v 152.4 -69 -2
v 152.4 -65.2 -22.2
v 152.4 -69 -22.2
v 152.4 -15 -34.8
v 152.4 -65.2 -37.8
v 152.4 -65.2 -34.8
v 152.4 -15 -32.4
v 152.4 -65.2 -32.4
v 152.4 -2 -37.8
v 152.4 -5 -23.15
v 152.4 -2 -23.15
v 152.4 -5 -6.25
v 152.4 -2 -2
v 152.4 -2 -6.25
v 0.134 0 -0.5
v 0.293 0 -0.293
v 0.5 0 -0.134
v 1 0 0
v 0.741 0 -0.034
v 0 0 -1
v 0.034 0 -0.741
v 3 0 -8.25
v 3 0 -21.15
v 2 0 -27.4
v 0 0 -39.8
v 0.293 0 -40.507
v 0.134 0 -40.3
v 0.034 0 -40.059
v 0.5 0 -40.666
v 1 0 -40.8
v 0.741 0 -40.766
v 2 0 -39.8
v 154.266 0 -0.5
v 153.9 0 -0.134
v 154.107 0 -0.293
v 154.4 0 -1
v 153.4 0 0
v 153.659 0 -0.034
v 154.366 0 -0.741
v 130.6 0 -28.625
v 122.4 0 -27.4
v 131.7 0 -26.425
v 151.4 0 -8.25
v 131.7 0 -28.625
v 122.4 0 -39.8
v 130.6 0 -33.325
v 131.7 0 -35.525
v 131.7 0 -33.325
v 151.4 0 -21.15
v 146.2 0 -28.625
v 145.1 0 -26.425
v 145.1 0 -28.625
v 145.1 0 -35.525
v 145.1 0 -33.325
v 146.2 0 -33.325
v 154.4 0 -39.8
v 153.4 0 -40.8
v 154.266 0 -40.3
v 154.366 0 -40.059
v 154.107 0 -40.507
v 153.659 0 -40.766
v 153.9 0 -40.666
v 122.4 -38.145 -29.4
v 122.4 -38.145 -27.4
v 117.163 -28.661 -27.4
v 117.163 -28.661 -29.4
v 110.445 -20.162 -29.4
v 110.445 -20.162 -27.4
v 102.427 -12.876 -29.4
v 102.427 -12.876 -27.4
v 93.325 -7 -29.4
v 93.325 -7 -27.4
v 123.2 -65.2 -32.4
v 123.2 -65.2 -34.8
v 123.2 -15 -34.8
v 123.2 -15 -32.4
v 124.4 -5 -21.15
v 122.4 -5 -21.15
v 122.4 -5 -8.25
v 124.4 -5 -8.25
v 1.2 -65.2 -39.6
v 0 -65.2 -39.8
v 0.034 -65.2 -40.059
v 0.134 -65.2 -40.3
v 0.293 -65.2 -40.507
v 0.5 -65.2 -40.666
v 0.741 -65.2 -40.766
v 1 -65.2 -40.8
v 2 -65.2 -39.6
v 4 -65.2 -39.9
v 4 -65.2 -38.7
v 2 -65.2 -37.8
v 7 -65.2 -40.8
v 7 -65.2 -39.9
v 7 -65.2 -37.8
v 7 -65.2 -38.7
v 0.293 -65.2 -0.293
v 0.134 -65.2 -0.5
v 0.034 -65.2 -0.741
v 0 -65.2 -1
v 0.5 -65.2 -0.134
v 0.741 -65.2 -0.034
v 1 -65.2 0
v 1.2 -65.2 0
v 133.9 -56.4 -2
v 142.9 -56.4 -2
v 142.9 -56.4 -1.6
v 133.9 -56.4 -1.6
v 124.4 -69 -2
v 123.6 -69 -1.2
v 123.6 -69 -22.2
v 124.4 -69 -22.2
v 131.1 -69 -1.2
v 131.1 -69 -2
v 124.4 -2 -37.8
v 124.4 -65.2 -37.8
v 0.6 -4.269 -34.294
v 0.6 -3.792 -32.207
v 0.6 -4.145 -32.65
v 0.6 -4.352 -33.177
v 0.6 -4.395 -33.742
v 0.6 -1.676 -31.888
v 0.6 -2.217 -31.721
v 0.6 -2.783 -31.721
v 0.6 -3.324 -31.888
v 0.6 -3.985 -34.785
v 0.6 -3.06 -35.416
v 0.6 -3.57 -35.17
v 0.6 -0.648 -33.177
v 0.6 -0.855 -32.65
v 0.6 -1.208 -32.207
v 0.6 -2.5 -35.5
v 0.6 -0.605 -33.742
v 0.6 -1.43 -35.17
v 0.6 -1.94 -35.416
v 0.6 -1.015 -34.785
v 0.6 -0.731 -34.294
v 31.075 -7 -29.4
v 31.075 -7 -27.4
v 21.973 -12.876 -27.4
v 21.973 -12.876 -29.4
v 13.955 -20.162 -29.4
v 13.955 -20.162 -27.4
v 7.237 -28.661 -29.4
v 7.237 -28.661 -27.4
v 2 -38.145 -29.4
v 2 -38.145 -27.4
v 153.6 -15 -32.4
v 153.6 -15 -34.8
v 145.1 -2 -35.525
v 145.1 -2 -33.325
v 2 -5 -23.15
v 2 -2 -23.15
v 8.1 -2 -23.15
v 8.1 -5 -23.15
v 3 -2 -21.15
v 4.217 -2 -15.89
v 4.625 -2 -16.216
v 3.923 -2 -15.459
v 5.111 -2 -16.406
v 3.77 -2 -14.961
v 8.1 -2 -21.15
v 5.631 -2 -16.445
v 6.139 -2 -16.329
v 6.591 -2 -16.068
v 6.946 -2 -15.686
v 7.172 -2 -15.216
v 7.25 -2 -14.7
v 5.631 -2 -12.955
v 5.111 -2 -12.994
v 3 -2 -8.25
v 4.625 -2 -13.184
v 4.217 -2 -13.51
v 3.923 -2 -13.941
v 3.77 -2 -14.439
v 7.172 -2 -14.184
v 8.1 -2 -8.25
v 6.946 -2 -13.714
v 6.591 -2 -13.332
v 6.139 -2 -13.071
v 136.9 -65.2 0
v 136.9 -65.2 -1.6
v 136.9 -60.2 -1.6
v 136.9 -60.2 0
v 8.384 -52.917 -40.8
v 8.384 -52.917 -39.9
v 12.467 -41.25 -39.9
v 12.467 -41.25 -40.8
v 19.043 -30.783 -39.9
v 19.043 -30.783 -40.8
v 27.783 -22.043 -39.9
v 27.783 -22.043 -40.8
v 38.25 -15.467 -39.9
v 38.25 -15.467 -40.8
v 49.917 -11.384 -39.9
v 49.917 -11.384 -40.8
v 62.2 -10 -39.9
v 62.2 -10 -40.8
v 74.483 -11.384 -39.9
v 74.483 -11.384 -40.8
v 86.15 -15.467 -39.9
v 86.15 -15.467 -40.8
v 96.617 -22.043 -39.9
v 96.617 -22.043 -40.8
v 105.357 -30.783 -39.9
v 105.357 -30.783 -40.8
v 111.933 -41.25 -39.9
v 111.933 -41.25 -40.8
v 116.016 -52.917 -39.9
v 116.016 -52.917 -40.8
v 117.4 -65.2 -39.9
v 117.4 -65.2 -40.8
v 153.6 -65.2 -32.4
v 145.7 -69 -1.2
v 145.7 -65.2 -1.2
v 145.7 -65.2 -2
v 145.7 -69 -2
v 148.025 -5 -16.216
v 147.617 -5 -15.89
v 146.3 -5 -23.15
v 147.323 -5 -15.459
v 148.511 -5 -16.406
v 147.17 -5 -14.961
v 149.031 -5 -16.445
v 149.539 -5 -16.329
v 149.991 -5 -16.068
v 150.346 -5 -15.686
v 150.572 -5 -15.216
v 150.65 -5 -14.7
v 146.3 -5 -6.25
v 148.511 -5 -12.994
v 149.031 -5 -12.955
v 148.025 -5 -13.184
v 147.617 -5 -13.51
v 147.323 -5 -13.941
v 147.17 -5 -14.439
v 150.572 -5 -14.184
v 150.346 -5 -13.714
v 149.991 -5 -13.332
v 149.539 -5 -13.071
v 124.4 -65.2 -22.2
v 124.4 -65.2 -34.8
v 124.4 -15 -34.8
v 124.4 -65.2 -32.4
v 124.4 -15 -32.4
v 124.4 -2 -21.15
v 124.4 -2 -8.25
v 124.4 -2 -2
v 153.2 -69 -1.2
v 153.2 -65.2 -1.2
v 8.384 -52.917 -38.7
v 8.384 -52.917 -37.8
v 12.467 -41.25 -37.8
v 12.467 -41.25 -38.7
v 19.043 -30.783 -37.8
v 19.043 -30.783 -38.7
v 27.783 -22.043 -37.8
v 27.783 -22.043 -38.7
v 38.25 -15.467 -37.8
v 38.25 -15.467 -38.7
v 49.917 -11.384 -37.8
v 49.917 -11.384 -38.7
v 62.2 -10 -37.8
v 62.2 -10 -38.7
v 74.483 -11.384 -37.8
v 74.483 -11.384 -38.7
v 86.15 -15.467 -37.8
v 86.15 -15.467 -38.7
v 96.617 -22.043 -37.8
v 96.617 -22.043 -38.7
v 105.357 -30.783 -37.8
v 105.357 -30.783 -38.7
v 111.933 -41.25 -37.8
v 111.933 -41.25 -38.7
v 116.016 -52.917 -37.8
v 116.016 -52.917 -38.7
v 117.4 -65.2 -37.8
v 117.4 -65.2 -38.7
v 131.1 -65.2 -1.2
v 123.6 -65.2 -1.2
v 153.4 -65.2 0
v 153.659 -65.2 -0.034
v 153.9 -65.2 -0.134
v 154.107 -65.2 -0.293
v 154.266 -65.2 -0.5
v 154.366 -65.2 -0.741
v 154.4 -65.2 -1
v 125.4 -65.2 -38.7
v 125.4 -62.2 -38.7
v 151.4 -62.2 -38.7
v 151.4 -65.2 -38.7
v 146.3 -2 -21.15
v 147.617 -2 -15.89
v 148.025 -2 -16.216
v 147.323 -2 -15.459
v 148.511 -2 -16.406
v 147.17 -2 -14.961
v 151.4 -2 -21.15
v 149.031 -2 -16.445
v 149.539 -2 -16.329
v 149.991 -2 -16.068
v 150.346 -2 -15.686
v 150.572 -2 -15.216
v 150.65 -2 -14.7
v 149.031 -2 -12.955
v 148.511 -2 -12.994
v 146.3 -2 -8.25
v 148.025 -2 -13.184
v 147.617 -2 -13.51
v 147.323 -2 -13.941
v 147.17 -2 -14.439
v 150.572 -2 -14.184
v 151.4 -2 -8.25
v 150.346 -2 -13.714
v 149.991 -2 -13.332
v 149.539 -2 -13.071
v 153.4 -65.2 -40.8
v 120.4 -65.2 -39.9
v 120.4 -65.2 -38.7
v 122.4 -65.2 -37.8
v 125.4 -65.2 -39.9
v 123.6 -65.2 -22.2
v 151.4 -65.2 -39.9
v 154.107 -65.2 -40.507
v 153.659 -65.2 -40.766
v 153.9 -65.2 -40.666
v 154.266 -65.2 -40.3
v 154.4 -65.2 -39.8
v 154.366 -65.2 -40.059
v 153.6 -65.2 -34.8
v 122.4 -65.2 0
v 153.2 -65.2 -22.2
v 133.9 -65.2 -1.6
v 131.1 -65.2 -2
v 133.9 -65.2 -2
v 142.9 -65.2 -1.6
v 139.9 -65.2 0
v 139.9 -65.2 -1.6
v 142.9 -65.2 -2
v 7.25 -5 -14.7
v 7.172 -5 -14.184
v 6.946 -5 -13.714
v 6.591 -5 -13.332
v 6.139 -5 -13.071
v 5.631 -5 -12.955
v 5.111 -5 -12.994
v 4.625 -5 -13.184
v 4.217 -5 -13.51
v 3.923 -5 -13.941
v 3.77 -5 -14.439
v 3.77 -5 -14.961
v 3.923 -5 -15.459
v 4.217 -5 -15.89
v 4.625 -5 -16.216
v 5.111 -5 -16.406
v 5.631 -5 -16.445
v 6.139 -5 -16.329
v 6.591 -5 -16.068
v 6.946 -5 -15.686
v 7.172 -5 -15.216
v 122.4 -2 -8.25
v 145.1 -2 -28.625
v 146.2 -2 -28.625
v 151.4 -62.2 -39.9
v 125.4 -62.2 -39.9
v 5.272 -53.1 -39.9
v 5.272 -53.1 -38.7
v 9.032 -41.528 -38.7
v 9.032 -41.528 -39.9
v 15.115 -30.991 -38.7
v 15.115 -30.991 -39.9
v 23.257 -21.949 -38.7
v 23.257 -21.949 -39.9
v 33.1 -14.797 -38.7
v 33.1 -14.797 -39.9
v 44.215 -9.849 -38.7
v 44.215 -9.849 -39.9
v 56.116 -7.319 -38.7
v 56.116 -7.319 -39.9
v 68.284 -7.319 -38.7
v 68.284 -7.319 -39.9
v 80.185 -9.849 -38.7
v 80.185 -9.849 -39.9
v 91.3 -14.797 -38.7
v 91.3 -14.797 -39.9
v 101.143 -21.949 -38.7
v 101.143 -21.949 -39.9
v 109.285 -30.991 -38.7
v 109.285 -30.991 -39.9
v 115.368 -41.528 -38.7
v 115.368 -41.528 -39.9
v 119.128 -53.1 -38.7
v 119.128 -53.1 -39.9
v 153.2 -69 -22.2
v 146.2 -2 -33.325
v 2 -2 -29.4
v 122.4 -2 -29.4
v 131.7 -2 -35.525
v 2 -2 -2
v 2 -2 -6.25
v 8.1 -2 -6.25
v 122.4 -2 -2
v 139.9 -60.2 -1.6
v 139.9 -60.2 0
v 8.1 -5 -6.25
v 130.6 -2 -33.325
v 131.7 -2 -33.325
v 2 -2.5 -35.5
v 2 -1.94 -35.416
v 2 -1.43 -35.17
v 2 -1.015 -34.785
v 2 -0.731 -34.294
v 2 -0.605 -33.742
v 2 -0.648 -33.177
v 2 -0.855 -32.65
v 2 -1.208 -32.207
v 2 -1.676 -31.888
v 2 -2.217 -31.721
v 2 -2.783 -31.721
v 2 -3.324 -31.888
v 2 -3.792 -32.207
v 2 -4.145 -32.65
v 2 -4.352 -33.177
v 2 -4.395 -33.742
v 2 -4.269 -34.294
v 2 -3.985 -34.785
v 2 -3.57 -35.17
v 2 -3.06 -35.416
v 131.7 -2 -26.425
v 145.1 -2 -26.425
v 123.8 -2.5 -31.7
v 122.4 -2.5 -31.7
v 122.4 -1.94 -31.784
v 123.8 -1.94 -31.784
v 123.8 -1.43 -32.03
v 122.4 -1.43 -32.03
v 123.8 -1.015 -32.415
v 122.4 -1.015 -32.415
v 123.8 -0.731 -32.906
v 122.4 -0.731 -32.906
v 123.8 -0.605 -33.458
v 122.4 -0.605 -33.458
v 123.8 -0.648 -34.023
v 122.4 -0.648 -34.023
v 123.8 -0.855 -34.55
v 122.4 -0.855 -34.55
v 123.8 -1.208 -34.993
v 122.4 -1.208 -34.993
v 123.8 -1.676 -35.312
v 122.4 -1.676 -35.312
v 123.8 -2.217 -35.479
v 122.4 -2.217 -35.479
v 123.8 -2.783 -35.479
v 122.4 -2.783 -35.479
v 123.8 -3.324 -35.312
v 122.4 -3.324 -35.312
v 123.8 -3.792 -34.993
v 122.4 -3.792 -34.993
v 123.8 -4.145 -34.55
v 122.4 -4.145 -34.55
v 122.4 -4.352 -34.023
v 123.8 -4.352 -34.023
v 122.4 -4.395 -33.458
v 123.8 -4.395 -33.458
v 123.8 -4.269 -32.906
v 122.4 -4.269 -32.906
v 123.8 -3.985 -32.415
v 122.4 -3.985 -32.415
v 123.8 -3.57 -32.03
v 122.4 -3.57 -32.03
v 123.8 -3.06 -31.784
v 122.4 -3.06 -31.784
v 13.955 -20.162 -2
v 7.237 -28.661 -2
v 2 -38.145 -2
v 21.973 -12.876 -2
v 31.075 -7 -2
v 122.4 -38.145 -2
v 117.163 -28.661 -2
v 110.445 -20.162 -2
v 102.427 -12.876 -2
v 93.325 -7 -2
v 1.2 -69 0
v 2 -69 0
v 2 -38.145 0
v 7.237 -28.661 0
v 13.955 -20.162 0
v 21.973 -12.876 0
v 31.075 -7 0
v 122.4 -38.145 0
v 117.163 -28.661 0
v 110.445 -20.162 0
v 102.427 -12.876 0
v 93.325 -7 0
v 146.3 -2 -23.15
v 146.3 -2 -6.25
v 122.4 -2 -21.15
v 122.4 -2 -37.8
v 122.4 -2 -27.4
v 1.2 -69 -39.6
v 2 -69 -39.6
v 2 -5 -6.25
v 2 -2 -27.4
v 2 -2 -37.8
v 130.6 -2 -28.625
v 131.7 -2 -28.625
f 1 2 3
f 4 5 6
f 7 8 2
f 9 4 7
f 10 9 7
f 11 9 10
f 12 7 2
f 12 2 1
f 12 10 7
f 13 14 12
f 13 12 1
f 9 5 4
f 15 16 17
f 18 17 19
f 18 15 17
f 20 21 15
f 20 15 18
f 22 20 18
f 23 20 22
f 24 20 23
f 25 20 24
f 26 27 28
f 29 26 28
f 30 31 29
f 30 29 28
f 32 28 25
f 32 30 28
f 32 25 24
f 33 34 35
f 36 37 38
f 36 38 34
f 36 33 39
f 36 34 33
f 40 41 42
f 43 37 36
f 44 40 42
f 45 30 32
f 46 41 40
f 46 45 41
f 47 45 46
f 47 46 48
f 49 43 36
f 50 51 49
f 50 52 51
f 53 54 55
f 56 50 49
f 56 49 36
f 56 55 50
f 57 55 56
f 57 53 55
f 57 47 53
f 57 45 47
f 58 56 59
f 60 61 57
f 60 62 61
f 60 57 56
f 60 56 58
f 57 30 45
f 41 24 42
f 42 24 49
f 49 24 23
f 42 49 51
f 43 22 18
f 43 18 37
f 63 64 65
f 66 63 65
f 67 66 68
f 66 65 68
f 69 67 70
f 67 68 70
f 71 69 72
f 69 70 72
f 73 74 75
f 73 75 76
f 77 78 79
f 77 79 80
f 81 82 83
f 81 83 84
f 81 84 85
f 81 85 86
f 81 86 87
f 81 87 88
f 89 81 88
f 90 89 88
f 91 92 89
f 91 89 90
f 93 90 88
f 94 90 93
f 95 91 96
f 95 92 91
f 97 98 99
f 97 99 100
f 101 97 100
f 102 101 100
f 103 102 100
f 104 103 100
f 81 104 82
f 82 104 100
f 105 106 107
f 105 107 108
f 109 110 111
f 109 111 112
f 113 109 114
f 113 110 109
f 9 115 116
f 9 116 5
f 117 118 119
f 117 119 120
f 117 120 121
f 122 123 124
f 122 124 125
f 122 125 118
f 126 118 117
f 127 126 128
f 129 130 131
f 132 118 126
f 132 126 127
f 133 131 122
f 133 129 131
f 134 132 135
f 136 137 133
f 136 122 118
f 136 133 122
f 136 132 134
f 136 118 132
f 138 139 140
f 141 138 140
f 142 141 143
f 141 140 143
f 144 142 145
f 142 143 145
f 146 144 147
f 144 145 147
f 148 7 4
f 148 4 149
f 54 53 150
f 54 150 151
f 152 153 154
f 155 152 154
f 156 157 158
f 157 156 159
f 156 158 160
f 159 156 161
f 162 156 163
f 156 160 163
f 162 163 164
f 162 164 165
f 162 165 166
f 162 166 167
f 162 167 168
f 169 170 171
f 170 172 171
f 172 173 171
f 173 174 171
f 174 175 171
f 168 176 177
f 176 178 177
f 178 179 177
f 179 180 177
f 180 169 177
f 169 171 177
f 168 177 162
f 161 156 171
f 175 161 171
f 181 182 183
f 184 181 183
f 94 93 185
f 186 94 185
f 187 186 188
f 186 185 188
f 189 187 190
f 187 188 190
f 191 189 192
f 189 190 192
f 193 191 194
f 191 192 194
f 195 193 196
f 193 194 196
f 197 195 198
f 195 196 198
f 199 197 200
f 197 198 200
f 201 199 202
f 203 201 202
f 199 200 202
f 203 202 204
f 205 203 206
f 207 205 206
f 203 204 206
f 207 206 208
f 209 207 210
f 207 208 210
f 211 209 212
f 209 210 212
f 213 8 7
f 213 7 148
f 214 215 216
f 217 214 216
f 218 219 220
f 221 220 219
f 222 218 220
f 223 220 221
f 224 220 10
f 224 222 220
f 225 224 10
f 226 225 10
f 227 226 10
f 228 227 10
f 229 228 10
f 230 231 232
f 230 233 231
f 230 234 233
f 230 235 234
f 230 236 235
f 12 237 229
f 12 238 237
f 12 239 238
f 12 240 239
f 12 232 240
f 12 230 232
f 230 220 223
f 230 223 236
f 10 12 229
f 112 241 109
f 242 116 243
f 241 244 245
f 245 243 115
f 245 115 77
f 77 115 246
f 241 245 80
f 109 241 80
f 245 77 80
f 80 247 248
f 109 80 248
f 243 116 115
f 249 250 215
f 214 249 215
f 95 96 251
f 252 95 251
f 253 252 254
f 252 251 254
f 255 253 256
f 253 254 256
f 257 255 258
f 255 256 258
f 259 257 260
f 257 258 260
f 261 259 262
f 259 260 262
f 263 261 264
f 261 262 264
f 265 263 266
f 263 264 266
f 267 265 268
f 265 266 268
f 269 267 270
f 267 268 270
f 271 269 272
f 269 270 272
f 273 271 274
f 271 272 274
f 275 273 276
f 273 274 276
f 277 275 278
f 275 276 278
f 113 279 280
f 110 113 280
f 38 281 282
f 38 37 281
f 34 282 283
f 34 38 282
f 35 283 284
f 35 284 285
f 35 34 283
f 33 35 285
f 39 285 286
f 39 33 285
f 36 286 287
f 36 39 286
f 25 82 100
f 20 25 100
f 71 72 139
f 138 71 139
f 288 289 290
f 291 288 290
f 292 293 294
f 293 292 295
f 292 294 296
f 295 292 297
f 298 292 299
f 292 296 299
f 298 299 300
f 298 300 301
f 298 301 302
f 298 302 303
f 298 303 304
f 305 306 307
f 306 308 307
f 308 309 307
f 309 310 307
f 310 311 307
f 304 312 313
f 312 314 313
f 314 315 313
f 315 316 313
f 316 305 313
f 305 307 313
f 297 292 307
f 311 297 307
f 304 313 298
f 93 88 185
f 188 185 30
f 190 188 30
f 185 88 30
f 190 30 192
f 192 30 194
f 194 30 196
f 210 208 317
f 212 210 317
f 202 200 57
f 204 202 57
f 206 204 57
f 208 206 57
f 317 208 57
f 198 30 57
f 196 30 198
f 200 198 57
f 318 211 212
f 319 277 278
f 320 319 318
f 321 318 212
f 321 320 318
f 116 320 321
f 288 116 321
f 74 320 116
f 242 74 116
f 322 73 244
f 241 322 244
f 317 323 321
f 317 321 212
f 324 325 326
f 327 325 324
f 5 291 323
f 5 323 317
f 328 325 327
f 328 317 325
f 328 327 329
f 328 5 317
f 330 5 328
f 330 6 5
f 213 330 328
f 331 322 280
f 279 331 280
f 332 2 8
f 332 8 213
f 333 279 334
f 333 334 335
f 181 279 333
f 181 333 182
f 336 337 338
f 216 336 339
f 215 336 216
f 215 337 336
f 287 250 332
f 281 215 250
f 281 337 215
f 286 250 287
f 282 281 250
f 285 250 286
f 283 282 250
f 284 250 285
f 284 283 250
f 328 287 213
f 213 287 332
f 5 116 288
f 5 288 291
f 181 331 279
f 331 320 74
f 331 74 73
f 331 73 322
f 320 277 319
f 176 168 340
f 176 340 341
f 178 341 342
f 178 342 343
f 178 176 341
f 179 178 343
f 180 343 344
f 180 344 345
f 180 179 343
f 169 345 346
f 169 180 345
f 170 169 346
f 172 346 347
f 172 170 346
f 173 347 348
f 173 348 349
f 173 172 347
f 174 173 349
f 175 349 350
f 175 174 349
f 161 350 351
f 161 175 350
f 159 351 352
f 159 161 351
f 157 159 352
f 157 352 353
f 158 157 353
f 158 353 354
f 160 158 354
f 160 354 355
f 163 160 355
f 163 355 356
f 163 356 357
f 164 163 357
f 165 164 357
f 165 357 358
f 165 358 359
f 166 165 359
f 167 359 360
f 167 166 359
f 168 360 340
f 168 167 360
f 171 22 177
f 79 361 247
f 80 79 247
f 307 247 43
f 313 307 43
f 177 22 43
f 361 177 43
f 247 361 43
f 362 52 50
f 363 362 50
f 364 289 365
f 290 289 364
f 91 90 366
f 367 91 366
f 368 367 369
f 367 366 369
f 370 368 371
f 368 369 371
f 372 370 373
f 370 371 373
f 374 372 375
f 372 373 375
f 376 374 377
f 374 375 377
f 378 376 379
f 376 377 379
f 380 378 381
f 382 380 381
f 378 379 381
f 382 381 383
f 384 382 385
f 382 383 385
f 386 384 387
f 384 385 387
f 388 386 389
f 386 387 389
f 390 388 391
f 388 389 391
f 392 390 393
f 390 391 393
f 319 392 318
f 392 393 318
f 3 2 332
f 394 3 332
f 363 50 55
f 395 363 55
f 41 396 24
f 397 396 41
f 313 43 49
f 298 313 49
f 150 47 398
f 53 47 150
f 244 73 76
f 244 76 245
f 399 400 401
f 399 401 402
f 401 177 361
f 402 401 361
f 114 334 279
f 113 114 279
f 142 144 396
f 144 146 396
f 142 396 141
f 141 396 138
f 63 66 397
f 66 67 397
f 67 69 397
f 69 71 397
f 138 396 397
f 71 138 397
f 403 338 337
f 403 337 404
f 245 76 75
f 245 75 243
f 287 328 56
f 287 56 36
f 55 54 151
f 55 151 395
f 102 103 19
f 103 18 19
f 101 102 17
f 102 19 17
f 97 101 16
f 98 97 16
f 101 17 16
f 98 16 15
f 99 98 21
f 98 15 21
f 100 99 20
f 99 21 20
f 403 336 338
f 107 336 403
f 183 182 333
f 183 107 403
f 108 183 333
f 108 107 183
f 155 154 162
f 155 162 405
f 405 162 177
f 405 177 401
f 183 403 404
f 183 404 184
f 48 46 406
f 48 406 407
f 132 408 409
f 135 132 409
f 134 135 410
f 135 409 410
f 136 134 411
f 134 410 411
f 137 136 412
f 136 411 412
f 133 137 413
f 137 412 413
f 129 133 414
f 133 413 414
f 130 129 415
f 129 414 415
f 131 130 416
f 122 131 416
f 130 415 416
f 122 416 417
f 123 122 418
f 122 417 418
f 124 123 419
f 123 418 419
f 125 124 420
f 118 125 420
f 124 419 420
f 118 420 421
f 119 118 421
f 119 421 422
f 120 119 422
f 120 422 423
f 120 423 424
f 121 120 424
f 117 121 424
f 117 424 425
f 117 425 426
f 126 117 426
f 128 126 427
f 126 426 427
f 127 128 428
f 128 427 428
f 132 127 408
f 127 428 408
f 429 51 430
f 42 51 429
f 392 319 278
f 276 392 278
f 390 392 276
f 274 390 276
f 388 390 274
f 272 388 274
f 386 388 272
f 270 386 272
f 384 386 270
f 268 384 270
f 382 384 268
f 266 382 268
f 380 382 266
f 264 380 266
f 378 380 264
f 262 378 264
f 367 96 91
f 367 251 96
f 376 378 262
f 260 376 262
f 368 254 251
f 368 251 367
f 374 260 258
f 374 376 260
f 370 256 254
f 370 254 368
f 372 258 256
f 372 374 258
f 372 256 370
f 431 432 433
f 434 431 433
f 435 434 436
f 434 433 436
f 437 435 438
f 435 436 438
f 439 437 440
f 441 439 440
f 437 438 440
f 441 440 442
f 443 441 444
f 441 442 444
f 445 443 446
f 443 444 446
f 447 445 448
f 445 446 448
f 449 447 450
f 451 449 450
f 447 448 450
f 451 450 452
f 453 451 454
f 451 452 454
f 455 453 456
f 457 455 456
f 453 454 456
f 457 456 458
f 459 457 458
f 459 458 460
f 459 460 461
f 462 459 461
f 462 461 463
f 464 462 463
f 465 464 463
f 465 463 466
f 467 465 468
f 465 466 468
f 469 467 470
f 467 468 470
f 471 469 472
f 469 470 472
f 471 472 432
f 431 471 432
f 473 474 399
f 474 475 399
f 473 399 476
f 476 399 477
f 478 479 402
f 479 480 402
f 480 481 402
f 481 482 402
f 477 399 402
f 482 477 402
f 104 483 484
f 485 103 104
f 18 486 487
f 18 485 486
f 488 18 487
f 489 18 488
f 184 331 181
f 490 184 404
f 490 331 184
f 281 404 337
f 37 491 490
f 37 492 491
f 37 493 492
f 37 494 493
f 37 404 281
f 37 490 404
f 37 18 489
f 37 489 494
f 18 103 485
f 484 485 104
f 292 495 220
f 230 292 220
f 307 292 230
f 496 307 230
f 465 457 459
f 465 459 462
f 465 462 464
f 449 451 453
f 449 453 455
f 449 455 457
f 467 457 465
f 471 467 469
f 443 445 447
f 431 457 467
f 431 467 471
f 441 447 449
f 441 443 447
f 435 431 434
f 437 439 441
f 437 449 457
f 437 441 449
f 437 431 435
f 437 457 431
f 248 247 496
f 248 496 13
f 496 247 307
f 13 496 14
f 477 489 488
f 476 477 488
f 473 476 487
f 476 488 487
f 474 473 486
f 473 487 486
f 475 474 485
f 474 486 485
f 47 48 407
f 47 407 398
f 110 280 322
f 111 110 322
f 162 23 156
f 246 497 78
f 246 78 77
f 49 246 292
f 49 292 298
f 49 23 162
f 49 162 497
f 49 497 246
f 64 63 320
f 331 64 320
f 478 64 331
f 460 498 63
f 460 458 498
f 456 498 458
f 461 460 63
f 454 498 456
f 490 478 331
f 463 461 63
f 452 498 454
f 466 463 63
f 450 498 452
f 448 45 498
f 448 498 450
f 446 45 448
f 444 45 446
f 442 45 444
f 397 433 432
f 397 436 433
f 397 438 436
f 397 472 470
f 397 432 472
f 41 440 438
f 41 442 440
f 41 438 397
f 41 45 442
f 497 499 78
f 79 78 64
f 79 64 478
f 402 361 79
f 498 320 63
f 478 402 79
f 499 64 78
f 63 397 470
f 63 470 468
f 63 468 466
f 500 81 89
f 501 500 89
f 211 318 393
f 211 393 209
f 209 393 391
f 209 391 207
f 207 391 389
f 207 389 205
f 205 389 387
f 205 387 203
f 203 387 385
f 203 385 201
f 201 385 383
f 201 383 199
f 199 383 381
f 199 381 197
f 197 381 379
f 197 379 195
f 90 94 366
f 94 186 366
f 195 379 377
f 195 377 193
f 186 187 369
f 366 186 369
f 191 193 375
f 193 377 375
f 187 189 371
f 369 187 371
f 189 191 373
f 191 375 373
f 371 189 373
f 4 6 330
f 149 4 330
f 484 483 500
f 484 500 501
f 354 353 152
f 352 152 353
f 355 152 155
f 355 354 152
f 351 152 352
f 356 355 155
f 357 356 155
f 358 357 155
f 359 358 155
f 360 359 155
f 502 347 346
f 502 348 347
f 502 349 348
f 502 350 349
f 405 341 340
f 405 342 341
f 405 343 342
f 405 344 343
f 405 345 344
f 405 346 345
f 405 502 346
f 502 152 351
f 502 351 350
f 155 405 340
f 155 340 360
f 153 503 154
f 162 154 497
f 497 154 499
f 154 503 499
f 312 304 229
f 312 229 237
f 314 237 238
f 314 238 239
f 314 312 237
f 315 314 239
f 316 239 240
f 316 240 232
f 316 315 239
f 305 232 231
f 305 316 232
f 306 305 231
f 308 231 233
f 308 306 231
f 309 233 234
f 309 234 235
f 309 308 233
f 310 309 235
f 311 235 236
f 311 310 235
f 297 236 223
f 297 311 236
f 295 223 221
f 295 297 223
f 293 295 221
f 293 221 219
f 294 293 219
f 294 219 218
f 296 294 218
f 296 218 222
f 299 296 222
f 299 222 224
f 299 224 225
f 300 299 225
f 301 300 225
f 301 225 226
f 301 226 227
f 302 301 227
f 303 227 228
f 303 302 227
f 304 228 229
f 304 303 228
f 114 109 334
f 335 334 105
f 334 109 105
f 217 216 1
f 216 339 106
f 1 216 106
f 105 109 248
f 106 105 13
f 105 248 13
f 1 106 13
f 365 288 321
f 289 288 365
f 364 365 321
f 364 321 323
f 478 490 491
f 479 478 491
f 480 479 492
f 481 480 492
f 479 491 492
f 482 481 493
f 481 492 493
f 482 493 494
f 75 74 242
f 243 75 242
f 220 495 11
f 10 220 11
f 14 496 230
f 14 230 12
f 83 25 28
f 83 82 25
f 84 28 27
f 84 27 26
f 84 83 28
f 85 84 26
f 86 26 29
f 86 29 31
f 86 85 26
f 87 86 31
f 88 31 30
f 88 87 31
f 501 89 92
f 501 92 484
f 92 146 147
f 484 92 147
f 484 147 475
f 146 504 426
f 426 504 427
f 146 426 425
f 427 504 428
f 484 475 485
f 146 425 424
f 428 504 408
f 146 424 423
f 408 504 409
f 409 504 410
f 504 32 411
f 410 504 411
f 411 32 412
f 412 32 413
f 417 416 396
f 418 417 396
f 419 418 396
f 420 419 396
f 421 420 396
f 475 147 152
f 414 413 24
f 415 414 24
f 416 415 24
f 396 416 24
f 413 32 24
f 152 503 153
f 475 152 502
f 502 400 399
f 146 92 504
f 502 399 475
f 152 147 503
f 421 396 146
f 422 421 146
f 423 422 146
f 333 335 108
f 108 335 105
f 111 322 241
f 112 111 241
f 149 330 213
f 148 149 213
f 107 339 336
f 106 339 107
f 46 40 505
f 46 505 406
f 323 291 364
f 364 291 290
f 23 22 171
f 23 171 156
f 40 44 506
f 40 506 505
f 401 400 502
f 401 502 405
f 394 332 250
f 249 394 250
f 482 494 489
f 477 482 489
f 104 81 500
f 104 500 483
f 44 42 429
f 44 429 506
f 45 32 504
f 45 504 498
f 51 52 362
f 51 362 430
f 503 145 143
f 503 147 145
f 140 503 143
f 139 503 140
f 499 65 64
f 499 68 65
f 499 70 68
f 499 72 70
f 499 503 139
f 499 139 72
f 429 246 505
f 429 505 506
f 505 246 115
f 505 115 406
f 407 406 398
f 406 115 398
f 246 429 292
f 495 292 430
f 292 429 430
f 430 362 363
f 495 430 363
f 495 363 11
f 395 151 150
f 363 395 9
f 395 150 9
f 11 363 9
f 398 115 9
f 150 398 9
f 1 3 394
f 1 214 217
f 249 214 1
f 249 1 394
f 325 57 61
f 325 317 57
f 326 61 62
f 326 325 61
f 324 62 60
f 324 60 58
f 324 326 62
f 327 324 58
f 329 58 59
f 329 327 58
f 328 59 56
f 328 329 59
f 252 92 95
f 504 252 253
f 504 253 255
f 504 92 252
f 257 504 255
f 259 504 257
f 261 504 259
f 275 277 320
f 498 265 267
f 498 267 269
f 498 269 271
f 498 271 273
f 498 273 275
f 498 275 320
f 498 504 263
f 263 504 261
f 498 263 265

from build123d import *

# Parameters (mm, degrees)
ESQUISSE1_W              = 154.4
ESQUISSE1_H              = 40.8
BOSS_EXTRU_1_DEPTH       = 2
ESQUISSE2_W              = 154.4
ESQUISSE2_H              = 40.8
ESQUISSE2_W_2            = 120.4
ESQUISSE2_H_2            = 25.4
ESQUISSE2_H_3            = 8.4
ESQUISSE2_W_3            = 28
ESQUISSE2_H_4            = 35.8
BOSS_EXTRU_2_DEPTH       = 63.2
ENL_V_MAT_EXTRU_1_DEPTH  = 29.4
ESQUISSE8_W              = 9
ESQUISSE8_H              = 8.8
ENL_V_MAT_EXTRU_3_DEPTH  = 0.4
ESQUISSE9_W              = 3
ESQUISSE9_H              = 5
ENL_V_MAT_EXTRU_4_DEPTH  = 2.6
ESQUISSE10_W             = 1.2
ESQUISSE10_H             = 2.4
ENL_V_MAT_EXTRU_5_DEPTH  = 50.2
ESQUISSE12_W             = 0.8
ESQUISSE12_H             = 39.6
BOSS_EXTRU_3_DEPTH       = 3.8
ENL_V_MAT_EXTRU_6_REACH  = 71
ESQUISSE14_W             = 120.4
ESQUISSE14_H             = 8.4
ESQUISSE16_W             = 148.4
ESQUISSE16_H             = 12.9
ENL_V_MAT_EXTRU_8_DEPTH  = 2
ESQUISSE17_W             = 6.1
ESQUISSE17_H             = 16.9
ESQUISSE17_R             = 1.75
BOSS_EXTRU_5_DEPTH       = 3
ESQUISSE19_W             = 138.2
ESQUISSE19_H             = 12.9
ENL_V_MAT_EXTRU_10_DEPTH = 3
ESQUISSE20_R             = 1.9
ENL_V_MAT_EXTRU_11_DEPTH = 1.4
ESQUISSE21_R             = 1.9
ENL_V_MAT_EXTRU_12_DEPTH = 1.4
ENL_V_MAT_EXTRU_13_REACH = 42.8
ESQUISSE22_R             = 55.2
ENL_V_START              = -0.9
ESQUISSE23_R             = 58.2
ENL_V_MAT_EXTRU_14_DEPTH = 1.2
ENL_V_MAT_EXTRU_16_REACH = 71
ESQUISSE24_W             = 1.1
ESQUISSE24_H             = 4.7
ESQUISSE27_W             = 26
ESQUISSE27_H             = 3
ENL_V_MAT_EXTRU_17_DEPTH = 1.2
CONG_1_R                 = 1
CHANFREIN1_SIZE          = 2


with BuildPart() as part:
    # Esquisse1 → Boss.-Extru.1 (new body)
    with BuildSketch(Plane(origin=(0, 0, 0), x_dir=(1, 0, 0), z_dir=(0, 1, 0))):
        with Locations((77.2, 20.4)):
            Rectangle(ESQUISSE1_W, ESQUISSE1_H)
    extrude(amount=-BOSS_EXTRU_1_DEPTH)

    # Esquisse2 → Boss.-Extru.2 (add)
    with BuildSketch(Plane.XZ.offset(2)):
        with Locations((77.2, -20.4)):
            Rectangle(ESQUISSE2_W, ESQUISSE2_H)
        with Locations((62.2, -14.7)):
            Rectangle(ESQUISSE2_W_2, ESQUISSE2_H_2, mode=Mode.SUBTRACT)
        with Locations((62.2, -33.6)):
            Rectangle(ESQUISSE2_W_2, ESQUISSE2_H_3, mode=Mode.SUBTRACT)
        with Locations((138.4, -19.9)):
            Rectangle(ESQUISSE2_W_3, ESQUISSE2_H_4, mode=Mode.SUBTRACT)
    extrude(amount=BOSS_EXTRU_2_DEPTH)

    # Esquisse3 → Enlèv. mat.-Extru.1 (cut)
    with BuildSketch(Plane.XY):
        with BuildLine():
            Line((93.324909638, -7), (31.075090362, -7))
            ThreePointArc((31.075090362, -7), (13.955142399, -20.16186377), (2, -38.145240714))
            Line((2, -38.145240714), (2, -65.2))
            Line((2, -65.2), (122.4, -65.2))
            Line((122.4, -65.2), (122.4, -38.145240714))
            ThreePointArc((122.4, -38.145240714), (110.444857601, -20.16186377), (93.324909638, -7))
        make_face()
    extrude(amount=-ENL_V_MAT_EXTRU_1_DEPTH, mode=Mode.SUBTRACT)

    # Esquisse8 → Enlèv. mat.-Extru.3 (cut)
    with BuildSketch(Plane(origin=(0, 0, -2), x_dir=(-1, 0, 0), z_dir=(0, 0, -1))):
        with Locations((-138.4, -60.8)):
            Rectangle(ESQUISSE8_W, ESQUISSE8_H)
    extrude(amount=-ENL_V_MAT_EXTRU_3_DEPTH, mode=Mode.SUBTRACT)

    # Esquisse9 → Enlèv. mat.-Extru.4 (cut, through all)
    with BuildSketch(Plane(origin=(0, 0, -1.6), x_dir=(-1, 0, 0), z_dir=(0, 0, -1))):
        with Locations((-138.4, -62.7)):
            Rectangle(ESQUISSE9_W, ESQUISSE9_H)
    extrude(amount=-ENL_V_MAT_EXTRU_4_DEPTH, mode=Mode.SUBTRACT)

    # Esquisse10 → Enlèv. mat.-Extru.5 (cut)
    with BuildSketch(Plane.XZ.offset(65.2)):
        with Locations((153, -33.6)):
            Rectangle(ESQUISSE10_W, ESQUISSE10_H)
        with Locations((123.8, -33.6)):
            Rectangle(ESQUISSE10_W, ESQUISSE10_H)
    extrude(amount=-ENL_V_MAT_EXTRU_5_DEPTH, mode=Mode.SUBTRACT)

    # Esquisse12 → Boss.-Extru.3 (add)
    with BuildSketch(Plane.XZ.offset(65.2)):
        with Locations((1.6, -19.8)):
            Rectangle(ESQUISSE12_W, ESQUISSE12_H)
        Polygon((152.4, -2), (152.4, -22.2), (153.2, -22.2), (153.2, -1.2), (145.7, -1.2), (145.7, -2), align=None)
        Polygon((131.1, -2), (131.1, -1.2), (123.6, -1.2), (123.6, -22.2), (124.4, -22.2), (124.4, -2), align=None)
    extrude(amount=BOSS_EXTRU_3_DEPTH)

    # Esquisse14 → Enlèv. mat.-Extru.6 (cut, up to next)
    with BuildSketch(Plane(origin=(0, 0, 0), x_dir=(1, 0, 0), z_dir=(0, 1, 0)), mode=Mode.PRIVATE) as enl_v_mat_extru_6_sk1:
        with Locations((62.2, 33.6)):
            Rectangle(ESQUISSE14_W, ESQUISSE14_H)
    enl_v_mat_extru_6_tool1 = extrude(enl_v_mat_extru_6_sk1.sketch, amount=-ENL_V_MAT_EXTRU_6_REACH, mode=Mode.PRIVATE) & part.part
    add(enl_v_mat_extru_6_tool1.solids().sort_by_distance((62.2, 0, -33.6))[0], mode=Mode.SUBTRACT)

    # Esquisse16 → Enlèv. mat.-Extru.8 (cut)
    with BuildSketch(Plane(origin=(0, 0, 0), x_dir=(1, 0, 0), z_dir=(0, 1, 0))):
        with Locations((77.2, 14.7)):
            Rectangle(ESQUISSE16_W, ESQUISSE16_H)
    extrude(amount=-ENL_V_MAT_EXTRU_8_DEPTH, mode=Mode.SUBTRACT)

    # Esquisse17 → Boss.-Extru.5 (add)
    with BuildSketch(Plane.XZ.offset(2)):
        with Locations((5.05, -14.7)):
            Rectangle(ESQUISSE17_W, ESQUISSE17_H)
        with Locations((5.5, -14.7)):
            Circle(ESQUISSE17_R, mode=Mode.SUBTRACT)
        with Locations((149.35, -14.7)):
            Rectangle(ESQUISSE17_W, ESQUISSE17_H)
        with Locations((148.9, -14.7)):
            Circle(ESQUISSE17_R, mode=Mode.SUBTRACT)
    extrude(amount=BOSS_EXTRU_5_DEPTH)

    # Esquisse19 → Enlèv. mat.-Extru.10 (cut)
    with BuildSketch(Plane(origin=(0, -2, 0), x_dir=(1, 0, 0), z_dir=(0, 1, 0))):
        with Locations((77.2, 14.7)):
            Rectangle(ESQUISSE19_W, ESQUISSE19_H)
    extrude(amount=-ENL_V_MAT_EXTRU_10_DEPTH, mode=Mode.SUBTRACT)

    # Esquisse20 → Enlèv. mat.-Extru.11 (cut)
    with BuildSketch(Plane.ZY.offset(-122.4)):
        with Locations((-33.6, -2.5)):
            Circle(ESQUISSE20_R)
    extrude(amount=-ENL_V_MAT_EXTRU_11_DEPTH, mode=Mode.SUBTRACT)

    # Esquisse21 → Enlèv. mat.-Extru.12 (cut)
    with BuildSketch(Plane(origin=(2, 0, 0), x_dir=(0, 0, -1), z_dir=(1, 0, 0))):
        with Locations((33.6, -2.5)):
            Circle(ESQUISSE21_R)
    extrude(amount=-ENL_V_MAT_EXTRU_12_DEPTH, mode=Mode.SUBTRACT)

    # Esquisse22 → Enlèv. mat.-Extru.13 (cut, up to next)
    with BuildSketch(Plane(origin=(0, 0, -40.8), x_dir=(-1, 0, 0), z_dir=(0, 0, -1)), mode=Mode.PRIVATE) as enl_v_mat_extru_13_sk1:
        with Locations((-62.2, -65.2)):
            Circle(ESQUISSE22_R)
    enl_v_mat_extru_13_tool1 = extrude(enl_v_mat_extru_13_sk1.sketch, amount=-ENL_V_MAT_EXTRU_13_REACH, mode=Mode.PRIVATE) & part.part
    add(enl_v_mat_extru_13_tool1.solids().sort_by_distance((62.2, -65.2, -40.8))[0], mode=Mode.SUBTRACT)

    # Esquisse23 → Enlèv. mat.-Extru.14 (cut)
    with BuildSketch(Plane(origin=(0, 0, -40.8), x_dir=(-1, 0, 0), z_dir=(0, 0, -1)).offset(ENL_V_START)):
        with Locations((-62.2, -65.2)):
            Circle(ESQUISSE23_R)
    extrude(amount=-ENL_V_MAT_EXTRU_14_DEPTH, mode=Mode.SUBTRACT)

    # Esquisse24 → Enlèv. mat.-Extru.16 (cut, up to next)
    with BuildSketch(Plane(origin=(0, 0, 0), x_dir=(1, 0, 0), z_dir=(0, 1, 0)), mode=Mode.PRIVATE) as enl_v_mat_extru_16_sk1:
        Polygon((131.7, 35.525), (145.1, 35.525), (145.1, 26.425), (131.7, 26.425), (131.7, 28.625), (130.6, 28.625), (130.6, 33.325), (131.7, 33.325), align=None)
    enl_v_mat_extru_16_tool1 = extrude(enl_v_mat_extru_16_sk1.sketch, amount=-ENL_V_MAT_EXTRU_16_REACH, mode=Mode.PRIVATE) & part.part
    add(enl_v_mat_extru_16_tool1.solids().sort_by_distance((138.105118, 0, -30.975))[0], mode=Mode.SUBTRACT)
    # Esquisse24 → Enlèv. mat.-Extru.16 (cut, up to next)
    with BuildSketch(Plane(origin=(0, 0, 0), x_dir=(1, 0, 0), z_dir=(0, 1, 0)), mode=Mode.PRIVATE) as enl_v_mat_extru_16_sk2:
        with Locations((145.65, 30.975)):
            Rectangle(ESQUISSE24_W, ESQUISSE24_H)
    enl_v_mat_extru_16_tool2 = extrude(enl_v_mat_extru_16_sk2.sketch, amount=-ENL_V_MAT_EXTRU_16_REACH, mode=Mode.PRIVATE) & part.part
    add(enl_v_mat_extru_16_tool2.solids().sort_by_distance((145.65, 0, -30.975))[0], mode=Mode.SUBTRACT)

    # Esquisse27 → Enlèv. mat.-Extru.17 (cut)
    with BuildSketch(Plane.XY.offset(-37.8).offset(ENL_V_START)):
        with Locations((138.4, -63.7)):
            Rectangle(ESQUISSE27_W, ESQUISSE27_H)
    extrude(amount=-ENL_V_MAT_EXTRU_17_DEPTH, mode=Mode.SUBTRACT)

    # Congé1
    cong_1_edges = [part.edges().sort_by_distance(p)[0] for p in [
        (0, -32.6, -40.8),
        (154.4, -32.6, -40.8),
        (154.4, -32.6, 0),
        (0, -32.6, 0),
    ]]
    fillet(cong_1_edges, radius=CONG_1_R)

    # Chanfrein1
    chanfrein1_edges = [part.edges().sort_by_distance(p)[0] for p in [
        (62.2, 0, -29.4),
        (62.2, 0, -37.8),
    ]]
    chamfer(chanfrein1_edges, length=CHANFREIN1_SIZE)


solid = part.part
